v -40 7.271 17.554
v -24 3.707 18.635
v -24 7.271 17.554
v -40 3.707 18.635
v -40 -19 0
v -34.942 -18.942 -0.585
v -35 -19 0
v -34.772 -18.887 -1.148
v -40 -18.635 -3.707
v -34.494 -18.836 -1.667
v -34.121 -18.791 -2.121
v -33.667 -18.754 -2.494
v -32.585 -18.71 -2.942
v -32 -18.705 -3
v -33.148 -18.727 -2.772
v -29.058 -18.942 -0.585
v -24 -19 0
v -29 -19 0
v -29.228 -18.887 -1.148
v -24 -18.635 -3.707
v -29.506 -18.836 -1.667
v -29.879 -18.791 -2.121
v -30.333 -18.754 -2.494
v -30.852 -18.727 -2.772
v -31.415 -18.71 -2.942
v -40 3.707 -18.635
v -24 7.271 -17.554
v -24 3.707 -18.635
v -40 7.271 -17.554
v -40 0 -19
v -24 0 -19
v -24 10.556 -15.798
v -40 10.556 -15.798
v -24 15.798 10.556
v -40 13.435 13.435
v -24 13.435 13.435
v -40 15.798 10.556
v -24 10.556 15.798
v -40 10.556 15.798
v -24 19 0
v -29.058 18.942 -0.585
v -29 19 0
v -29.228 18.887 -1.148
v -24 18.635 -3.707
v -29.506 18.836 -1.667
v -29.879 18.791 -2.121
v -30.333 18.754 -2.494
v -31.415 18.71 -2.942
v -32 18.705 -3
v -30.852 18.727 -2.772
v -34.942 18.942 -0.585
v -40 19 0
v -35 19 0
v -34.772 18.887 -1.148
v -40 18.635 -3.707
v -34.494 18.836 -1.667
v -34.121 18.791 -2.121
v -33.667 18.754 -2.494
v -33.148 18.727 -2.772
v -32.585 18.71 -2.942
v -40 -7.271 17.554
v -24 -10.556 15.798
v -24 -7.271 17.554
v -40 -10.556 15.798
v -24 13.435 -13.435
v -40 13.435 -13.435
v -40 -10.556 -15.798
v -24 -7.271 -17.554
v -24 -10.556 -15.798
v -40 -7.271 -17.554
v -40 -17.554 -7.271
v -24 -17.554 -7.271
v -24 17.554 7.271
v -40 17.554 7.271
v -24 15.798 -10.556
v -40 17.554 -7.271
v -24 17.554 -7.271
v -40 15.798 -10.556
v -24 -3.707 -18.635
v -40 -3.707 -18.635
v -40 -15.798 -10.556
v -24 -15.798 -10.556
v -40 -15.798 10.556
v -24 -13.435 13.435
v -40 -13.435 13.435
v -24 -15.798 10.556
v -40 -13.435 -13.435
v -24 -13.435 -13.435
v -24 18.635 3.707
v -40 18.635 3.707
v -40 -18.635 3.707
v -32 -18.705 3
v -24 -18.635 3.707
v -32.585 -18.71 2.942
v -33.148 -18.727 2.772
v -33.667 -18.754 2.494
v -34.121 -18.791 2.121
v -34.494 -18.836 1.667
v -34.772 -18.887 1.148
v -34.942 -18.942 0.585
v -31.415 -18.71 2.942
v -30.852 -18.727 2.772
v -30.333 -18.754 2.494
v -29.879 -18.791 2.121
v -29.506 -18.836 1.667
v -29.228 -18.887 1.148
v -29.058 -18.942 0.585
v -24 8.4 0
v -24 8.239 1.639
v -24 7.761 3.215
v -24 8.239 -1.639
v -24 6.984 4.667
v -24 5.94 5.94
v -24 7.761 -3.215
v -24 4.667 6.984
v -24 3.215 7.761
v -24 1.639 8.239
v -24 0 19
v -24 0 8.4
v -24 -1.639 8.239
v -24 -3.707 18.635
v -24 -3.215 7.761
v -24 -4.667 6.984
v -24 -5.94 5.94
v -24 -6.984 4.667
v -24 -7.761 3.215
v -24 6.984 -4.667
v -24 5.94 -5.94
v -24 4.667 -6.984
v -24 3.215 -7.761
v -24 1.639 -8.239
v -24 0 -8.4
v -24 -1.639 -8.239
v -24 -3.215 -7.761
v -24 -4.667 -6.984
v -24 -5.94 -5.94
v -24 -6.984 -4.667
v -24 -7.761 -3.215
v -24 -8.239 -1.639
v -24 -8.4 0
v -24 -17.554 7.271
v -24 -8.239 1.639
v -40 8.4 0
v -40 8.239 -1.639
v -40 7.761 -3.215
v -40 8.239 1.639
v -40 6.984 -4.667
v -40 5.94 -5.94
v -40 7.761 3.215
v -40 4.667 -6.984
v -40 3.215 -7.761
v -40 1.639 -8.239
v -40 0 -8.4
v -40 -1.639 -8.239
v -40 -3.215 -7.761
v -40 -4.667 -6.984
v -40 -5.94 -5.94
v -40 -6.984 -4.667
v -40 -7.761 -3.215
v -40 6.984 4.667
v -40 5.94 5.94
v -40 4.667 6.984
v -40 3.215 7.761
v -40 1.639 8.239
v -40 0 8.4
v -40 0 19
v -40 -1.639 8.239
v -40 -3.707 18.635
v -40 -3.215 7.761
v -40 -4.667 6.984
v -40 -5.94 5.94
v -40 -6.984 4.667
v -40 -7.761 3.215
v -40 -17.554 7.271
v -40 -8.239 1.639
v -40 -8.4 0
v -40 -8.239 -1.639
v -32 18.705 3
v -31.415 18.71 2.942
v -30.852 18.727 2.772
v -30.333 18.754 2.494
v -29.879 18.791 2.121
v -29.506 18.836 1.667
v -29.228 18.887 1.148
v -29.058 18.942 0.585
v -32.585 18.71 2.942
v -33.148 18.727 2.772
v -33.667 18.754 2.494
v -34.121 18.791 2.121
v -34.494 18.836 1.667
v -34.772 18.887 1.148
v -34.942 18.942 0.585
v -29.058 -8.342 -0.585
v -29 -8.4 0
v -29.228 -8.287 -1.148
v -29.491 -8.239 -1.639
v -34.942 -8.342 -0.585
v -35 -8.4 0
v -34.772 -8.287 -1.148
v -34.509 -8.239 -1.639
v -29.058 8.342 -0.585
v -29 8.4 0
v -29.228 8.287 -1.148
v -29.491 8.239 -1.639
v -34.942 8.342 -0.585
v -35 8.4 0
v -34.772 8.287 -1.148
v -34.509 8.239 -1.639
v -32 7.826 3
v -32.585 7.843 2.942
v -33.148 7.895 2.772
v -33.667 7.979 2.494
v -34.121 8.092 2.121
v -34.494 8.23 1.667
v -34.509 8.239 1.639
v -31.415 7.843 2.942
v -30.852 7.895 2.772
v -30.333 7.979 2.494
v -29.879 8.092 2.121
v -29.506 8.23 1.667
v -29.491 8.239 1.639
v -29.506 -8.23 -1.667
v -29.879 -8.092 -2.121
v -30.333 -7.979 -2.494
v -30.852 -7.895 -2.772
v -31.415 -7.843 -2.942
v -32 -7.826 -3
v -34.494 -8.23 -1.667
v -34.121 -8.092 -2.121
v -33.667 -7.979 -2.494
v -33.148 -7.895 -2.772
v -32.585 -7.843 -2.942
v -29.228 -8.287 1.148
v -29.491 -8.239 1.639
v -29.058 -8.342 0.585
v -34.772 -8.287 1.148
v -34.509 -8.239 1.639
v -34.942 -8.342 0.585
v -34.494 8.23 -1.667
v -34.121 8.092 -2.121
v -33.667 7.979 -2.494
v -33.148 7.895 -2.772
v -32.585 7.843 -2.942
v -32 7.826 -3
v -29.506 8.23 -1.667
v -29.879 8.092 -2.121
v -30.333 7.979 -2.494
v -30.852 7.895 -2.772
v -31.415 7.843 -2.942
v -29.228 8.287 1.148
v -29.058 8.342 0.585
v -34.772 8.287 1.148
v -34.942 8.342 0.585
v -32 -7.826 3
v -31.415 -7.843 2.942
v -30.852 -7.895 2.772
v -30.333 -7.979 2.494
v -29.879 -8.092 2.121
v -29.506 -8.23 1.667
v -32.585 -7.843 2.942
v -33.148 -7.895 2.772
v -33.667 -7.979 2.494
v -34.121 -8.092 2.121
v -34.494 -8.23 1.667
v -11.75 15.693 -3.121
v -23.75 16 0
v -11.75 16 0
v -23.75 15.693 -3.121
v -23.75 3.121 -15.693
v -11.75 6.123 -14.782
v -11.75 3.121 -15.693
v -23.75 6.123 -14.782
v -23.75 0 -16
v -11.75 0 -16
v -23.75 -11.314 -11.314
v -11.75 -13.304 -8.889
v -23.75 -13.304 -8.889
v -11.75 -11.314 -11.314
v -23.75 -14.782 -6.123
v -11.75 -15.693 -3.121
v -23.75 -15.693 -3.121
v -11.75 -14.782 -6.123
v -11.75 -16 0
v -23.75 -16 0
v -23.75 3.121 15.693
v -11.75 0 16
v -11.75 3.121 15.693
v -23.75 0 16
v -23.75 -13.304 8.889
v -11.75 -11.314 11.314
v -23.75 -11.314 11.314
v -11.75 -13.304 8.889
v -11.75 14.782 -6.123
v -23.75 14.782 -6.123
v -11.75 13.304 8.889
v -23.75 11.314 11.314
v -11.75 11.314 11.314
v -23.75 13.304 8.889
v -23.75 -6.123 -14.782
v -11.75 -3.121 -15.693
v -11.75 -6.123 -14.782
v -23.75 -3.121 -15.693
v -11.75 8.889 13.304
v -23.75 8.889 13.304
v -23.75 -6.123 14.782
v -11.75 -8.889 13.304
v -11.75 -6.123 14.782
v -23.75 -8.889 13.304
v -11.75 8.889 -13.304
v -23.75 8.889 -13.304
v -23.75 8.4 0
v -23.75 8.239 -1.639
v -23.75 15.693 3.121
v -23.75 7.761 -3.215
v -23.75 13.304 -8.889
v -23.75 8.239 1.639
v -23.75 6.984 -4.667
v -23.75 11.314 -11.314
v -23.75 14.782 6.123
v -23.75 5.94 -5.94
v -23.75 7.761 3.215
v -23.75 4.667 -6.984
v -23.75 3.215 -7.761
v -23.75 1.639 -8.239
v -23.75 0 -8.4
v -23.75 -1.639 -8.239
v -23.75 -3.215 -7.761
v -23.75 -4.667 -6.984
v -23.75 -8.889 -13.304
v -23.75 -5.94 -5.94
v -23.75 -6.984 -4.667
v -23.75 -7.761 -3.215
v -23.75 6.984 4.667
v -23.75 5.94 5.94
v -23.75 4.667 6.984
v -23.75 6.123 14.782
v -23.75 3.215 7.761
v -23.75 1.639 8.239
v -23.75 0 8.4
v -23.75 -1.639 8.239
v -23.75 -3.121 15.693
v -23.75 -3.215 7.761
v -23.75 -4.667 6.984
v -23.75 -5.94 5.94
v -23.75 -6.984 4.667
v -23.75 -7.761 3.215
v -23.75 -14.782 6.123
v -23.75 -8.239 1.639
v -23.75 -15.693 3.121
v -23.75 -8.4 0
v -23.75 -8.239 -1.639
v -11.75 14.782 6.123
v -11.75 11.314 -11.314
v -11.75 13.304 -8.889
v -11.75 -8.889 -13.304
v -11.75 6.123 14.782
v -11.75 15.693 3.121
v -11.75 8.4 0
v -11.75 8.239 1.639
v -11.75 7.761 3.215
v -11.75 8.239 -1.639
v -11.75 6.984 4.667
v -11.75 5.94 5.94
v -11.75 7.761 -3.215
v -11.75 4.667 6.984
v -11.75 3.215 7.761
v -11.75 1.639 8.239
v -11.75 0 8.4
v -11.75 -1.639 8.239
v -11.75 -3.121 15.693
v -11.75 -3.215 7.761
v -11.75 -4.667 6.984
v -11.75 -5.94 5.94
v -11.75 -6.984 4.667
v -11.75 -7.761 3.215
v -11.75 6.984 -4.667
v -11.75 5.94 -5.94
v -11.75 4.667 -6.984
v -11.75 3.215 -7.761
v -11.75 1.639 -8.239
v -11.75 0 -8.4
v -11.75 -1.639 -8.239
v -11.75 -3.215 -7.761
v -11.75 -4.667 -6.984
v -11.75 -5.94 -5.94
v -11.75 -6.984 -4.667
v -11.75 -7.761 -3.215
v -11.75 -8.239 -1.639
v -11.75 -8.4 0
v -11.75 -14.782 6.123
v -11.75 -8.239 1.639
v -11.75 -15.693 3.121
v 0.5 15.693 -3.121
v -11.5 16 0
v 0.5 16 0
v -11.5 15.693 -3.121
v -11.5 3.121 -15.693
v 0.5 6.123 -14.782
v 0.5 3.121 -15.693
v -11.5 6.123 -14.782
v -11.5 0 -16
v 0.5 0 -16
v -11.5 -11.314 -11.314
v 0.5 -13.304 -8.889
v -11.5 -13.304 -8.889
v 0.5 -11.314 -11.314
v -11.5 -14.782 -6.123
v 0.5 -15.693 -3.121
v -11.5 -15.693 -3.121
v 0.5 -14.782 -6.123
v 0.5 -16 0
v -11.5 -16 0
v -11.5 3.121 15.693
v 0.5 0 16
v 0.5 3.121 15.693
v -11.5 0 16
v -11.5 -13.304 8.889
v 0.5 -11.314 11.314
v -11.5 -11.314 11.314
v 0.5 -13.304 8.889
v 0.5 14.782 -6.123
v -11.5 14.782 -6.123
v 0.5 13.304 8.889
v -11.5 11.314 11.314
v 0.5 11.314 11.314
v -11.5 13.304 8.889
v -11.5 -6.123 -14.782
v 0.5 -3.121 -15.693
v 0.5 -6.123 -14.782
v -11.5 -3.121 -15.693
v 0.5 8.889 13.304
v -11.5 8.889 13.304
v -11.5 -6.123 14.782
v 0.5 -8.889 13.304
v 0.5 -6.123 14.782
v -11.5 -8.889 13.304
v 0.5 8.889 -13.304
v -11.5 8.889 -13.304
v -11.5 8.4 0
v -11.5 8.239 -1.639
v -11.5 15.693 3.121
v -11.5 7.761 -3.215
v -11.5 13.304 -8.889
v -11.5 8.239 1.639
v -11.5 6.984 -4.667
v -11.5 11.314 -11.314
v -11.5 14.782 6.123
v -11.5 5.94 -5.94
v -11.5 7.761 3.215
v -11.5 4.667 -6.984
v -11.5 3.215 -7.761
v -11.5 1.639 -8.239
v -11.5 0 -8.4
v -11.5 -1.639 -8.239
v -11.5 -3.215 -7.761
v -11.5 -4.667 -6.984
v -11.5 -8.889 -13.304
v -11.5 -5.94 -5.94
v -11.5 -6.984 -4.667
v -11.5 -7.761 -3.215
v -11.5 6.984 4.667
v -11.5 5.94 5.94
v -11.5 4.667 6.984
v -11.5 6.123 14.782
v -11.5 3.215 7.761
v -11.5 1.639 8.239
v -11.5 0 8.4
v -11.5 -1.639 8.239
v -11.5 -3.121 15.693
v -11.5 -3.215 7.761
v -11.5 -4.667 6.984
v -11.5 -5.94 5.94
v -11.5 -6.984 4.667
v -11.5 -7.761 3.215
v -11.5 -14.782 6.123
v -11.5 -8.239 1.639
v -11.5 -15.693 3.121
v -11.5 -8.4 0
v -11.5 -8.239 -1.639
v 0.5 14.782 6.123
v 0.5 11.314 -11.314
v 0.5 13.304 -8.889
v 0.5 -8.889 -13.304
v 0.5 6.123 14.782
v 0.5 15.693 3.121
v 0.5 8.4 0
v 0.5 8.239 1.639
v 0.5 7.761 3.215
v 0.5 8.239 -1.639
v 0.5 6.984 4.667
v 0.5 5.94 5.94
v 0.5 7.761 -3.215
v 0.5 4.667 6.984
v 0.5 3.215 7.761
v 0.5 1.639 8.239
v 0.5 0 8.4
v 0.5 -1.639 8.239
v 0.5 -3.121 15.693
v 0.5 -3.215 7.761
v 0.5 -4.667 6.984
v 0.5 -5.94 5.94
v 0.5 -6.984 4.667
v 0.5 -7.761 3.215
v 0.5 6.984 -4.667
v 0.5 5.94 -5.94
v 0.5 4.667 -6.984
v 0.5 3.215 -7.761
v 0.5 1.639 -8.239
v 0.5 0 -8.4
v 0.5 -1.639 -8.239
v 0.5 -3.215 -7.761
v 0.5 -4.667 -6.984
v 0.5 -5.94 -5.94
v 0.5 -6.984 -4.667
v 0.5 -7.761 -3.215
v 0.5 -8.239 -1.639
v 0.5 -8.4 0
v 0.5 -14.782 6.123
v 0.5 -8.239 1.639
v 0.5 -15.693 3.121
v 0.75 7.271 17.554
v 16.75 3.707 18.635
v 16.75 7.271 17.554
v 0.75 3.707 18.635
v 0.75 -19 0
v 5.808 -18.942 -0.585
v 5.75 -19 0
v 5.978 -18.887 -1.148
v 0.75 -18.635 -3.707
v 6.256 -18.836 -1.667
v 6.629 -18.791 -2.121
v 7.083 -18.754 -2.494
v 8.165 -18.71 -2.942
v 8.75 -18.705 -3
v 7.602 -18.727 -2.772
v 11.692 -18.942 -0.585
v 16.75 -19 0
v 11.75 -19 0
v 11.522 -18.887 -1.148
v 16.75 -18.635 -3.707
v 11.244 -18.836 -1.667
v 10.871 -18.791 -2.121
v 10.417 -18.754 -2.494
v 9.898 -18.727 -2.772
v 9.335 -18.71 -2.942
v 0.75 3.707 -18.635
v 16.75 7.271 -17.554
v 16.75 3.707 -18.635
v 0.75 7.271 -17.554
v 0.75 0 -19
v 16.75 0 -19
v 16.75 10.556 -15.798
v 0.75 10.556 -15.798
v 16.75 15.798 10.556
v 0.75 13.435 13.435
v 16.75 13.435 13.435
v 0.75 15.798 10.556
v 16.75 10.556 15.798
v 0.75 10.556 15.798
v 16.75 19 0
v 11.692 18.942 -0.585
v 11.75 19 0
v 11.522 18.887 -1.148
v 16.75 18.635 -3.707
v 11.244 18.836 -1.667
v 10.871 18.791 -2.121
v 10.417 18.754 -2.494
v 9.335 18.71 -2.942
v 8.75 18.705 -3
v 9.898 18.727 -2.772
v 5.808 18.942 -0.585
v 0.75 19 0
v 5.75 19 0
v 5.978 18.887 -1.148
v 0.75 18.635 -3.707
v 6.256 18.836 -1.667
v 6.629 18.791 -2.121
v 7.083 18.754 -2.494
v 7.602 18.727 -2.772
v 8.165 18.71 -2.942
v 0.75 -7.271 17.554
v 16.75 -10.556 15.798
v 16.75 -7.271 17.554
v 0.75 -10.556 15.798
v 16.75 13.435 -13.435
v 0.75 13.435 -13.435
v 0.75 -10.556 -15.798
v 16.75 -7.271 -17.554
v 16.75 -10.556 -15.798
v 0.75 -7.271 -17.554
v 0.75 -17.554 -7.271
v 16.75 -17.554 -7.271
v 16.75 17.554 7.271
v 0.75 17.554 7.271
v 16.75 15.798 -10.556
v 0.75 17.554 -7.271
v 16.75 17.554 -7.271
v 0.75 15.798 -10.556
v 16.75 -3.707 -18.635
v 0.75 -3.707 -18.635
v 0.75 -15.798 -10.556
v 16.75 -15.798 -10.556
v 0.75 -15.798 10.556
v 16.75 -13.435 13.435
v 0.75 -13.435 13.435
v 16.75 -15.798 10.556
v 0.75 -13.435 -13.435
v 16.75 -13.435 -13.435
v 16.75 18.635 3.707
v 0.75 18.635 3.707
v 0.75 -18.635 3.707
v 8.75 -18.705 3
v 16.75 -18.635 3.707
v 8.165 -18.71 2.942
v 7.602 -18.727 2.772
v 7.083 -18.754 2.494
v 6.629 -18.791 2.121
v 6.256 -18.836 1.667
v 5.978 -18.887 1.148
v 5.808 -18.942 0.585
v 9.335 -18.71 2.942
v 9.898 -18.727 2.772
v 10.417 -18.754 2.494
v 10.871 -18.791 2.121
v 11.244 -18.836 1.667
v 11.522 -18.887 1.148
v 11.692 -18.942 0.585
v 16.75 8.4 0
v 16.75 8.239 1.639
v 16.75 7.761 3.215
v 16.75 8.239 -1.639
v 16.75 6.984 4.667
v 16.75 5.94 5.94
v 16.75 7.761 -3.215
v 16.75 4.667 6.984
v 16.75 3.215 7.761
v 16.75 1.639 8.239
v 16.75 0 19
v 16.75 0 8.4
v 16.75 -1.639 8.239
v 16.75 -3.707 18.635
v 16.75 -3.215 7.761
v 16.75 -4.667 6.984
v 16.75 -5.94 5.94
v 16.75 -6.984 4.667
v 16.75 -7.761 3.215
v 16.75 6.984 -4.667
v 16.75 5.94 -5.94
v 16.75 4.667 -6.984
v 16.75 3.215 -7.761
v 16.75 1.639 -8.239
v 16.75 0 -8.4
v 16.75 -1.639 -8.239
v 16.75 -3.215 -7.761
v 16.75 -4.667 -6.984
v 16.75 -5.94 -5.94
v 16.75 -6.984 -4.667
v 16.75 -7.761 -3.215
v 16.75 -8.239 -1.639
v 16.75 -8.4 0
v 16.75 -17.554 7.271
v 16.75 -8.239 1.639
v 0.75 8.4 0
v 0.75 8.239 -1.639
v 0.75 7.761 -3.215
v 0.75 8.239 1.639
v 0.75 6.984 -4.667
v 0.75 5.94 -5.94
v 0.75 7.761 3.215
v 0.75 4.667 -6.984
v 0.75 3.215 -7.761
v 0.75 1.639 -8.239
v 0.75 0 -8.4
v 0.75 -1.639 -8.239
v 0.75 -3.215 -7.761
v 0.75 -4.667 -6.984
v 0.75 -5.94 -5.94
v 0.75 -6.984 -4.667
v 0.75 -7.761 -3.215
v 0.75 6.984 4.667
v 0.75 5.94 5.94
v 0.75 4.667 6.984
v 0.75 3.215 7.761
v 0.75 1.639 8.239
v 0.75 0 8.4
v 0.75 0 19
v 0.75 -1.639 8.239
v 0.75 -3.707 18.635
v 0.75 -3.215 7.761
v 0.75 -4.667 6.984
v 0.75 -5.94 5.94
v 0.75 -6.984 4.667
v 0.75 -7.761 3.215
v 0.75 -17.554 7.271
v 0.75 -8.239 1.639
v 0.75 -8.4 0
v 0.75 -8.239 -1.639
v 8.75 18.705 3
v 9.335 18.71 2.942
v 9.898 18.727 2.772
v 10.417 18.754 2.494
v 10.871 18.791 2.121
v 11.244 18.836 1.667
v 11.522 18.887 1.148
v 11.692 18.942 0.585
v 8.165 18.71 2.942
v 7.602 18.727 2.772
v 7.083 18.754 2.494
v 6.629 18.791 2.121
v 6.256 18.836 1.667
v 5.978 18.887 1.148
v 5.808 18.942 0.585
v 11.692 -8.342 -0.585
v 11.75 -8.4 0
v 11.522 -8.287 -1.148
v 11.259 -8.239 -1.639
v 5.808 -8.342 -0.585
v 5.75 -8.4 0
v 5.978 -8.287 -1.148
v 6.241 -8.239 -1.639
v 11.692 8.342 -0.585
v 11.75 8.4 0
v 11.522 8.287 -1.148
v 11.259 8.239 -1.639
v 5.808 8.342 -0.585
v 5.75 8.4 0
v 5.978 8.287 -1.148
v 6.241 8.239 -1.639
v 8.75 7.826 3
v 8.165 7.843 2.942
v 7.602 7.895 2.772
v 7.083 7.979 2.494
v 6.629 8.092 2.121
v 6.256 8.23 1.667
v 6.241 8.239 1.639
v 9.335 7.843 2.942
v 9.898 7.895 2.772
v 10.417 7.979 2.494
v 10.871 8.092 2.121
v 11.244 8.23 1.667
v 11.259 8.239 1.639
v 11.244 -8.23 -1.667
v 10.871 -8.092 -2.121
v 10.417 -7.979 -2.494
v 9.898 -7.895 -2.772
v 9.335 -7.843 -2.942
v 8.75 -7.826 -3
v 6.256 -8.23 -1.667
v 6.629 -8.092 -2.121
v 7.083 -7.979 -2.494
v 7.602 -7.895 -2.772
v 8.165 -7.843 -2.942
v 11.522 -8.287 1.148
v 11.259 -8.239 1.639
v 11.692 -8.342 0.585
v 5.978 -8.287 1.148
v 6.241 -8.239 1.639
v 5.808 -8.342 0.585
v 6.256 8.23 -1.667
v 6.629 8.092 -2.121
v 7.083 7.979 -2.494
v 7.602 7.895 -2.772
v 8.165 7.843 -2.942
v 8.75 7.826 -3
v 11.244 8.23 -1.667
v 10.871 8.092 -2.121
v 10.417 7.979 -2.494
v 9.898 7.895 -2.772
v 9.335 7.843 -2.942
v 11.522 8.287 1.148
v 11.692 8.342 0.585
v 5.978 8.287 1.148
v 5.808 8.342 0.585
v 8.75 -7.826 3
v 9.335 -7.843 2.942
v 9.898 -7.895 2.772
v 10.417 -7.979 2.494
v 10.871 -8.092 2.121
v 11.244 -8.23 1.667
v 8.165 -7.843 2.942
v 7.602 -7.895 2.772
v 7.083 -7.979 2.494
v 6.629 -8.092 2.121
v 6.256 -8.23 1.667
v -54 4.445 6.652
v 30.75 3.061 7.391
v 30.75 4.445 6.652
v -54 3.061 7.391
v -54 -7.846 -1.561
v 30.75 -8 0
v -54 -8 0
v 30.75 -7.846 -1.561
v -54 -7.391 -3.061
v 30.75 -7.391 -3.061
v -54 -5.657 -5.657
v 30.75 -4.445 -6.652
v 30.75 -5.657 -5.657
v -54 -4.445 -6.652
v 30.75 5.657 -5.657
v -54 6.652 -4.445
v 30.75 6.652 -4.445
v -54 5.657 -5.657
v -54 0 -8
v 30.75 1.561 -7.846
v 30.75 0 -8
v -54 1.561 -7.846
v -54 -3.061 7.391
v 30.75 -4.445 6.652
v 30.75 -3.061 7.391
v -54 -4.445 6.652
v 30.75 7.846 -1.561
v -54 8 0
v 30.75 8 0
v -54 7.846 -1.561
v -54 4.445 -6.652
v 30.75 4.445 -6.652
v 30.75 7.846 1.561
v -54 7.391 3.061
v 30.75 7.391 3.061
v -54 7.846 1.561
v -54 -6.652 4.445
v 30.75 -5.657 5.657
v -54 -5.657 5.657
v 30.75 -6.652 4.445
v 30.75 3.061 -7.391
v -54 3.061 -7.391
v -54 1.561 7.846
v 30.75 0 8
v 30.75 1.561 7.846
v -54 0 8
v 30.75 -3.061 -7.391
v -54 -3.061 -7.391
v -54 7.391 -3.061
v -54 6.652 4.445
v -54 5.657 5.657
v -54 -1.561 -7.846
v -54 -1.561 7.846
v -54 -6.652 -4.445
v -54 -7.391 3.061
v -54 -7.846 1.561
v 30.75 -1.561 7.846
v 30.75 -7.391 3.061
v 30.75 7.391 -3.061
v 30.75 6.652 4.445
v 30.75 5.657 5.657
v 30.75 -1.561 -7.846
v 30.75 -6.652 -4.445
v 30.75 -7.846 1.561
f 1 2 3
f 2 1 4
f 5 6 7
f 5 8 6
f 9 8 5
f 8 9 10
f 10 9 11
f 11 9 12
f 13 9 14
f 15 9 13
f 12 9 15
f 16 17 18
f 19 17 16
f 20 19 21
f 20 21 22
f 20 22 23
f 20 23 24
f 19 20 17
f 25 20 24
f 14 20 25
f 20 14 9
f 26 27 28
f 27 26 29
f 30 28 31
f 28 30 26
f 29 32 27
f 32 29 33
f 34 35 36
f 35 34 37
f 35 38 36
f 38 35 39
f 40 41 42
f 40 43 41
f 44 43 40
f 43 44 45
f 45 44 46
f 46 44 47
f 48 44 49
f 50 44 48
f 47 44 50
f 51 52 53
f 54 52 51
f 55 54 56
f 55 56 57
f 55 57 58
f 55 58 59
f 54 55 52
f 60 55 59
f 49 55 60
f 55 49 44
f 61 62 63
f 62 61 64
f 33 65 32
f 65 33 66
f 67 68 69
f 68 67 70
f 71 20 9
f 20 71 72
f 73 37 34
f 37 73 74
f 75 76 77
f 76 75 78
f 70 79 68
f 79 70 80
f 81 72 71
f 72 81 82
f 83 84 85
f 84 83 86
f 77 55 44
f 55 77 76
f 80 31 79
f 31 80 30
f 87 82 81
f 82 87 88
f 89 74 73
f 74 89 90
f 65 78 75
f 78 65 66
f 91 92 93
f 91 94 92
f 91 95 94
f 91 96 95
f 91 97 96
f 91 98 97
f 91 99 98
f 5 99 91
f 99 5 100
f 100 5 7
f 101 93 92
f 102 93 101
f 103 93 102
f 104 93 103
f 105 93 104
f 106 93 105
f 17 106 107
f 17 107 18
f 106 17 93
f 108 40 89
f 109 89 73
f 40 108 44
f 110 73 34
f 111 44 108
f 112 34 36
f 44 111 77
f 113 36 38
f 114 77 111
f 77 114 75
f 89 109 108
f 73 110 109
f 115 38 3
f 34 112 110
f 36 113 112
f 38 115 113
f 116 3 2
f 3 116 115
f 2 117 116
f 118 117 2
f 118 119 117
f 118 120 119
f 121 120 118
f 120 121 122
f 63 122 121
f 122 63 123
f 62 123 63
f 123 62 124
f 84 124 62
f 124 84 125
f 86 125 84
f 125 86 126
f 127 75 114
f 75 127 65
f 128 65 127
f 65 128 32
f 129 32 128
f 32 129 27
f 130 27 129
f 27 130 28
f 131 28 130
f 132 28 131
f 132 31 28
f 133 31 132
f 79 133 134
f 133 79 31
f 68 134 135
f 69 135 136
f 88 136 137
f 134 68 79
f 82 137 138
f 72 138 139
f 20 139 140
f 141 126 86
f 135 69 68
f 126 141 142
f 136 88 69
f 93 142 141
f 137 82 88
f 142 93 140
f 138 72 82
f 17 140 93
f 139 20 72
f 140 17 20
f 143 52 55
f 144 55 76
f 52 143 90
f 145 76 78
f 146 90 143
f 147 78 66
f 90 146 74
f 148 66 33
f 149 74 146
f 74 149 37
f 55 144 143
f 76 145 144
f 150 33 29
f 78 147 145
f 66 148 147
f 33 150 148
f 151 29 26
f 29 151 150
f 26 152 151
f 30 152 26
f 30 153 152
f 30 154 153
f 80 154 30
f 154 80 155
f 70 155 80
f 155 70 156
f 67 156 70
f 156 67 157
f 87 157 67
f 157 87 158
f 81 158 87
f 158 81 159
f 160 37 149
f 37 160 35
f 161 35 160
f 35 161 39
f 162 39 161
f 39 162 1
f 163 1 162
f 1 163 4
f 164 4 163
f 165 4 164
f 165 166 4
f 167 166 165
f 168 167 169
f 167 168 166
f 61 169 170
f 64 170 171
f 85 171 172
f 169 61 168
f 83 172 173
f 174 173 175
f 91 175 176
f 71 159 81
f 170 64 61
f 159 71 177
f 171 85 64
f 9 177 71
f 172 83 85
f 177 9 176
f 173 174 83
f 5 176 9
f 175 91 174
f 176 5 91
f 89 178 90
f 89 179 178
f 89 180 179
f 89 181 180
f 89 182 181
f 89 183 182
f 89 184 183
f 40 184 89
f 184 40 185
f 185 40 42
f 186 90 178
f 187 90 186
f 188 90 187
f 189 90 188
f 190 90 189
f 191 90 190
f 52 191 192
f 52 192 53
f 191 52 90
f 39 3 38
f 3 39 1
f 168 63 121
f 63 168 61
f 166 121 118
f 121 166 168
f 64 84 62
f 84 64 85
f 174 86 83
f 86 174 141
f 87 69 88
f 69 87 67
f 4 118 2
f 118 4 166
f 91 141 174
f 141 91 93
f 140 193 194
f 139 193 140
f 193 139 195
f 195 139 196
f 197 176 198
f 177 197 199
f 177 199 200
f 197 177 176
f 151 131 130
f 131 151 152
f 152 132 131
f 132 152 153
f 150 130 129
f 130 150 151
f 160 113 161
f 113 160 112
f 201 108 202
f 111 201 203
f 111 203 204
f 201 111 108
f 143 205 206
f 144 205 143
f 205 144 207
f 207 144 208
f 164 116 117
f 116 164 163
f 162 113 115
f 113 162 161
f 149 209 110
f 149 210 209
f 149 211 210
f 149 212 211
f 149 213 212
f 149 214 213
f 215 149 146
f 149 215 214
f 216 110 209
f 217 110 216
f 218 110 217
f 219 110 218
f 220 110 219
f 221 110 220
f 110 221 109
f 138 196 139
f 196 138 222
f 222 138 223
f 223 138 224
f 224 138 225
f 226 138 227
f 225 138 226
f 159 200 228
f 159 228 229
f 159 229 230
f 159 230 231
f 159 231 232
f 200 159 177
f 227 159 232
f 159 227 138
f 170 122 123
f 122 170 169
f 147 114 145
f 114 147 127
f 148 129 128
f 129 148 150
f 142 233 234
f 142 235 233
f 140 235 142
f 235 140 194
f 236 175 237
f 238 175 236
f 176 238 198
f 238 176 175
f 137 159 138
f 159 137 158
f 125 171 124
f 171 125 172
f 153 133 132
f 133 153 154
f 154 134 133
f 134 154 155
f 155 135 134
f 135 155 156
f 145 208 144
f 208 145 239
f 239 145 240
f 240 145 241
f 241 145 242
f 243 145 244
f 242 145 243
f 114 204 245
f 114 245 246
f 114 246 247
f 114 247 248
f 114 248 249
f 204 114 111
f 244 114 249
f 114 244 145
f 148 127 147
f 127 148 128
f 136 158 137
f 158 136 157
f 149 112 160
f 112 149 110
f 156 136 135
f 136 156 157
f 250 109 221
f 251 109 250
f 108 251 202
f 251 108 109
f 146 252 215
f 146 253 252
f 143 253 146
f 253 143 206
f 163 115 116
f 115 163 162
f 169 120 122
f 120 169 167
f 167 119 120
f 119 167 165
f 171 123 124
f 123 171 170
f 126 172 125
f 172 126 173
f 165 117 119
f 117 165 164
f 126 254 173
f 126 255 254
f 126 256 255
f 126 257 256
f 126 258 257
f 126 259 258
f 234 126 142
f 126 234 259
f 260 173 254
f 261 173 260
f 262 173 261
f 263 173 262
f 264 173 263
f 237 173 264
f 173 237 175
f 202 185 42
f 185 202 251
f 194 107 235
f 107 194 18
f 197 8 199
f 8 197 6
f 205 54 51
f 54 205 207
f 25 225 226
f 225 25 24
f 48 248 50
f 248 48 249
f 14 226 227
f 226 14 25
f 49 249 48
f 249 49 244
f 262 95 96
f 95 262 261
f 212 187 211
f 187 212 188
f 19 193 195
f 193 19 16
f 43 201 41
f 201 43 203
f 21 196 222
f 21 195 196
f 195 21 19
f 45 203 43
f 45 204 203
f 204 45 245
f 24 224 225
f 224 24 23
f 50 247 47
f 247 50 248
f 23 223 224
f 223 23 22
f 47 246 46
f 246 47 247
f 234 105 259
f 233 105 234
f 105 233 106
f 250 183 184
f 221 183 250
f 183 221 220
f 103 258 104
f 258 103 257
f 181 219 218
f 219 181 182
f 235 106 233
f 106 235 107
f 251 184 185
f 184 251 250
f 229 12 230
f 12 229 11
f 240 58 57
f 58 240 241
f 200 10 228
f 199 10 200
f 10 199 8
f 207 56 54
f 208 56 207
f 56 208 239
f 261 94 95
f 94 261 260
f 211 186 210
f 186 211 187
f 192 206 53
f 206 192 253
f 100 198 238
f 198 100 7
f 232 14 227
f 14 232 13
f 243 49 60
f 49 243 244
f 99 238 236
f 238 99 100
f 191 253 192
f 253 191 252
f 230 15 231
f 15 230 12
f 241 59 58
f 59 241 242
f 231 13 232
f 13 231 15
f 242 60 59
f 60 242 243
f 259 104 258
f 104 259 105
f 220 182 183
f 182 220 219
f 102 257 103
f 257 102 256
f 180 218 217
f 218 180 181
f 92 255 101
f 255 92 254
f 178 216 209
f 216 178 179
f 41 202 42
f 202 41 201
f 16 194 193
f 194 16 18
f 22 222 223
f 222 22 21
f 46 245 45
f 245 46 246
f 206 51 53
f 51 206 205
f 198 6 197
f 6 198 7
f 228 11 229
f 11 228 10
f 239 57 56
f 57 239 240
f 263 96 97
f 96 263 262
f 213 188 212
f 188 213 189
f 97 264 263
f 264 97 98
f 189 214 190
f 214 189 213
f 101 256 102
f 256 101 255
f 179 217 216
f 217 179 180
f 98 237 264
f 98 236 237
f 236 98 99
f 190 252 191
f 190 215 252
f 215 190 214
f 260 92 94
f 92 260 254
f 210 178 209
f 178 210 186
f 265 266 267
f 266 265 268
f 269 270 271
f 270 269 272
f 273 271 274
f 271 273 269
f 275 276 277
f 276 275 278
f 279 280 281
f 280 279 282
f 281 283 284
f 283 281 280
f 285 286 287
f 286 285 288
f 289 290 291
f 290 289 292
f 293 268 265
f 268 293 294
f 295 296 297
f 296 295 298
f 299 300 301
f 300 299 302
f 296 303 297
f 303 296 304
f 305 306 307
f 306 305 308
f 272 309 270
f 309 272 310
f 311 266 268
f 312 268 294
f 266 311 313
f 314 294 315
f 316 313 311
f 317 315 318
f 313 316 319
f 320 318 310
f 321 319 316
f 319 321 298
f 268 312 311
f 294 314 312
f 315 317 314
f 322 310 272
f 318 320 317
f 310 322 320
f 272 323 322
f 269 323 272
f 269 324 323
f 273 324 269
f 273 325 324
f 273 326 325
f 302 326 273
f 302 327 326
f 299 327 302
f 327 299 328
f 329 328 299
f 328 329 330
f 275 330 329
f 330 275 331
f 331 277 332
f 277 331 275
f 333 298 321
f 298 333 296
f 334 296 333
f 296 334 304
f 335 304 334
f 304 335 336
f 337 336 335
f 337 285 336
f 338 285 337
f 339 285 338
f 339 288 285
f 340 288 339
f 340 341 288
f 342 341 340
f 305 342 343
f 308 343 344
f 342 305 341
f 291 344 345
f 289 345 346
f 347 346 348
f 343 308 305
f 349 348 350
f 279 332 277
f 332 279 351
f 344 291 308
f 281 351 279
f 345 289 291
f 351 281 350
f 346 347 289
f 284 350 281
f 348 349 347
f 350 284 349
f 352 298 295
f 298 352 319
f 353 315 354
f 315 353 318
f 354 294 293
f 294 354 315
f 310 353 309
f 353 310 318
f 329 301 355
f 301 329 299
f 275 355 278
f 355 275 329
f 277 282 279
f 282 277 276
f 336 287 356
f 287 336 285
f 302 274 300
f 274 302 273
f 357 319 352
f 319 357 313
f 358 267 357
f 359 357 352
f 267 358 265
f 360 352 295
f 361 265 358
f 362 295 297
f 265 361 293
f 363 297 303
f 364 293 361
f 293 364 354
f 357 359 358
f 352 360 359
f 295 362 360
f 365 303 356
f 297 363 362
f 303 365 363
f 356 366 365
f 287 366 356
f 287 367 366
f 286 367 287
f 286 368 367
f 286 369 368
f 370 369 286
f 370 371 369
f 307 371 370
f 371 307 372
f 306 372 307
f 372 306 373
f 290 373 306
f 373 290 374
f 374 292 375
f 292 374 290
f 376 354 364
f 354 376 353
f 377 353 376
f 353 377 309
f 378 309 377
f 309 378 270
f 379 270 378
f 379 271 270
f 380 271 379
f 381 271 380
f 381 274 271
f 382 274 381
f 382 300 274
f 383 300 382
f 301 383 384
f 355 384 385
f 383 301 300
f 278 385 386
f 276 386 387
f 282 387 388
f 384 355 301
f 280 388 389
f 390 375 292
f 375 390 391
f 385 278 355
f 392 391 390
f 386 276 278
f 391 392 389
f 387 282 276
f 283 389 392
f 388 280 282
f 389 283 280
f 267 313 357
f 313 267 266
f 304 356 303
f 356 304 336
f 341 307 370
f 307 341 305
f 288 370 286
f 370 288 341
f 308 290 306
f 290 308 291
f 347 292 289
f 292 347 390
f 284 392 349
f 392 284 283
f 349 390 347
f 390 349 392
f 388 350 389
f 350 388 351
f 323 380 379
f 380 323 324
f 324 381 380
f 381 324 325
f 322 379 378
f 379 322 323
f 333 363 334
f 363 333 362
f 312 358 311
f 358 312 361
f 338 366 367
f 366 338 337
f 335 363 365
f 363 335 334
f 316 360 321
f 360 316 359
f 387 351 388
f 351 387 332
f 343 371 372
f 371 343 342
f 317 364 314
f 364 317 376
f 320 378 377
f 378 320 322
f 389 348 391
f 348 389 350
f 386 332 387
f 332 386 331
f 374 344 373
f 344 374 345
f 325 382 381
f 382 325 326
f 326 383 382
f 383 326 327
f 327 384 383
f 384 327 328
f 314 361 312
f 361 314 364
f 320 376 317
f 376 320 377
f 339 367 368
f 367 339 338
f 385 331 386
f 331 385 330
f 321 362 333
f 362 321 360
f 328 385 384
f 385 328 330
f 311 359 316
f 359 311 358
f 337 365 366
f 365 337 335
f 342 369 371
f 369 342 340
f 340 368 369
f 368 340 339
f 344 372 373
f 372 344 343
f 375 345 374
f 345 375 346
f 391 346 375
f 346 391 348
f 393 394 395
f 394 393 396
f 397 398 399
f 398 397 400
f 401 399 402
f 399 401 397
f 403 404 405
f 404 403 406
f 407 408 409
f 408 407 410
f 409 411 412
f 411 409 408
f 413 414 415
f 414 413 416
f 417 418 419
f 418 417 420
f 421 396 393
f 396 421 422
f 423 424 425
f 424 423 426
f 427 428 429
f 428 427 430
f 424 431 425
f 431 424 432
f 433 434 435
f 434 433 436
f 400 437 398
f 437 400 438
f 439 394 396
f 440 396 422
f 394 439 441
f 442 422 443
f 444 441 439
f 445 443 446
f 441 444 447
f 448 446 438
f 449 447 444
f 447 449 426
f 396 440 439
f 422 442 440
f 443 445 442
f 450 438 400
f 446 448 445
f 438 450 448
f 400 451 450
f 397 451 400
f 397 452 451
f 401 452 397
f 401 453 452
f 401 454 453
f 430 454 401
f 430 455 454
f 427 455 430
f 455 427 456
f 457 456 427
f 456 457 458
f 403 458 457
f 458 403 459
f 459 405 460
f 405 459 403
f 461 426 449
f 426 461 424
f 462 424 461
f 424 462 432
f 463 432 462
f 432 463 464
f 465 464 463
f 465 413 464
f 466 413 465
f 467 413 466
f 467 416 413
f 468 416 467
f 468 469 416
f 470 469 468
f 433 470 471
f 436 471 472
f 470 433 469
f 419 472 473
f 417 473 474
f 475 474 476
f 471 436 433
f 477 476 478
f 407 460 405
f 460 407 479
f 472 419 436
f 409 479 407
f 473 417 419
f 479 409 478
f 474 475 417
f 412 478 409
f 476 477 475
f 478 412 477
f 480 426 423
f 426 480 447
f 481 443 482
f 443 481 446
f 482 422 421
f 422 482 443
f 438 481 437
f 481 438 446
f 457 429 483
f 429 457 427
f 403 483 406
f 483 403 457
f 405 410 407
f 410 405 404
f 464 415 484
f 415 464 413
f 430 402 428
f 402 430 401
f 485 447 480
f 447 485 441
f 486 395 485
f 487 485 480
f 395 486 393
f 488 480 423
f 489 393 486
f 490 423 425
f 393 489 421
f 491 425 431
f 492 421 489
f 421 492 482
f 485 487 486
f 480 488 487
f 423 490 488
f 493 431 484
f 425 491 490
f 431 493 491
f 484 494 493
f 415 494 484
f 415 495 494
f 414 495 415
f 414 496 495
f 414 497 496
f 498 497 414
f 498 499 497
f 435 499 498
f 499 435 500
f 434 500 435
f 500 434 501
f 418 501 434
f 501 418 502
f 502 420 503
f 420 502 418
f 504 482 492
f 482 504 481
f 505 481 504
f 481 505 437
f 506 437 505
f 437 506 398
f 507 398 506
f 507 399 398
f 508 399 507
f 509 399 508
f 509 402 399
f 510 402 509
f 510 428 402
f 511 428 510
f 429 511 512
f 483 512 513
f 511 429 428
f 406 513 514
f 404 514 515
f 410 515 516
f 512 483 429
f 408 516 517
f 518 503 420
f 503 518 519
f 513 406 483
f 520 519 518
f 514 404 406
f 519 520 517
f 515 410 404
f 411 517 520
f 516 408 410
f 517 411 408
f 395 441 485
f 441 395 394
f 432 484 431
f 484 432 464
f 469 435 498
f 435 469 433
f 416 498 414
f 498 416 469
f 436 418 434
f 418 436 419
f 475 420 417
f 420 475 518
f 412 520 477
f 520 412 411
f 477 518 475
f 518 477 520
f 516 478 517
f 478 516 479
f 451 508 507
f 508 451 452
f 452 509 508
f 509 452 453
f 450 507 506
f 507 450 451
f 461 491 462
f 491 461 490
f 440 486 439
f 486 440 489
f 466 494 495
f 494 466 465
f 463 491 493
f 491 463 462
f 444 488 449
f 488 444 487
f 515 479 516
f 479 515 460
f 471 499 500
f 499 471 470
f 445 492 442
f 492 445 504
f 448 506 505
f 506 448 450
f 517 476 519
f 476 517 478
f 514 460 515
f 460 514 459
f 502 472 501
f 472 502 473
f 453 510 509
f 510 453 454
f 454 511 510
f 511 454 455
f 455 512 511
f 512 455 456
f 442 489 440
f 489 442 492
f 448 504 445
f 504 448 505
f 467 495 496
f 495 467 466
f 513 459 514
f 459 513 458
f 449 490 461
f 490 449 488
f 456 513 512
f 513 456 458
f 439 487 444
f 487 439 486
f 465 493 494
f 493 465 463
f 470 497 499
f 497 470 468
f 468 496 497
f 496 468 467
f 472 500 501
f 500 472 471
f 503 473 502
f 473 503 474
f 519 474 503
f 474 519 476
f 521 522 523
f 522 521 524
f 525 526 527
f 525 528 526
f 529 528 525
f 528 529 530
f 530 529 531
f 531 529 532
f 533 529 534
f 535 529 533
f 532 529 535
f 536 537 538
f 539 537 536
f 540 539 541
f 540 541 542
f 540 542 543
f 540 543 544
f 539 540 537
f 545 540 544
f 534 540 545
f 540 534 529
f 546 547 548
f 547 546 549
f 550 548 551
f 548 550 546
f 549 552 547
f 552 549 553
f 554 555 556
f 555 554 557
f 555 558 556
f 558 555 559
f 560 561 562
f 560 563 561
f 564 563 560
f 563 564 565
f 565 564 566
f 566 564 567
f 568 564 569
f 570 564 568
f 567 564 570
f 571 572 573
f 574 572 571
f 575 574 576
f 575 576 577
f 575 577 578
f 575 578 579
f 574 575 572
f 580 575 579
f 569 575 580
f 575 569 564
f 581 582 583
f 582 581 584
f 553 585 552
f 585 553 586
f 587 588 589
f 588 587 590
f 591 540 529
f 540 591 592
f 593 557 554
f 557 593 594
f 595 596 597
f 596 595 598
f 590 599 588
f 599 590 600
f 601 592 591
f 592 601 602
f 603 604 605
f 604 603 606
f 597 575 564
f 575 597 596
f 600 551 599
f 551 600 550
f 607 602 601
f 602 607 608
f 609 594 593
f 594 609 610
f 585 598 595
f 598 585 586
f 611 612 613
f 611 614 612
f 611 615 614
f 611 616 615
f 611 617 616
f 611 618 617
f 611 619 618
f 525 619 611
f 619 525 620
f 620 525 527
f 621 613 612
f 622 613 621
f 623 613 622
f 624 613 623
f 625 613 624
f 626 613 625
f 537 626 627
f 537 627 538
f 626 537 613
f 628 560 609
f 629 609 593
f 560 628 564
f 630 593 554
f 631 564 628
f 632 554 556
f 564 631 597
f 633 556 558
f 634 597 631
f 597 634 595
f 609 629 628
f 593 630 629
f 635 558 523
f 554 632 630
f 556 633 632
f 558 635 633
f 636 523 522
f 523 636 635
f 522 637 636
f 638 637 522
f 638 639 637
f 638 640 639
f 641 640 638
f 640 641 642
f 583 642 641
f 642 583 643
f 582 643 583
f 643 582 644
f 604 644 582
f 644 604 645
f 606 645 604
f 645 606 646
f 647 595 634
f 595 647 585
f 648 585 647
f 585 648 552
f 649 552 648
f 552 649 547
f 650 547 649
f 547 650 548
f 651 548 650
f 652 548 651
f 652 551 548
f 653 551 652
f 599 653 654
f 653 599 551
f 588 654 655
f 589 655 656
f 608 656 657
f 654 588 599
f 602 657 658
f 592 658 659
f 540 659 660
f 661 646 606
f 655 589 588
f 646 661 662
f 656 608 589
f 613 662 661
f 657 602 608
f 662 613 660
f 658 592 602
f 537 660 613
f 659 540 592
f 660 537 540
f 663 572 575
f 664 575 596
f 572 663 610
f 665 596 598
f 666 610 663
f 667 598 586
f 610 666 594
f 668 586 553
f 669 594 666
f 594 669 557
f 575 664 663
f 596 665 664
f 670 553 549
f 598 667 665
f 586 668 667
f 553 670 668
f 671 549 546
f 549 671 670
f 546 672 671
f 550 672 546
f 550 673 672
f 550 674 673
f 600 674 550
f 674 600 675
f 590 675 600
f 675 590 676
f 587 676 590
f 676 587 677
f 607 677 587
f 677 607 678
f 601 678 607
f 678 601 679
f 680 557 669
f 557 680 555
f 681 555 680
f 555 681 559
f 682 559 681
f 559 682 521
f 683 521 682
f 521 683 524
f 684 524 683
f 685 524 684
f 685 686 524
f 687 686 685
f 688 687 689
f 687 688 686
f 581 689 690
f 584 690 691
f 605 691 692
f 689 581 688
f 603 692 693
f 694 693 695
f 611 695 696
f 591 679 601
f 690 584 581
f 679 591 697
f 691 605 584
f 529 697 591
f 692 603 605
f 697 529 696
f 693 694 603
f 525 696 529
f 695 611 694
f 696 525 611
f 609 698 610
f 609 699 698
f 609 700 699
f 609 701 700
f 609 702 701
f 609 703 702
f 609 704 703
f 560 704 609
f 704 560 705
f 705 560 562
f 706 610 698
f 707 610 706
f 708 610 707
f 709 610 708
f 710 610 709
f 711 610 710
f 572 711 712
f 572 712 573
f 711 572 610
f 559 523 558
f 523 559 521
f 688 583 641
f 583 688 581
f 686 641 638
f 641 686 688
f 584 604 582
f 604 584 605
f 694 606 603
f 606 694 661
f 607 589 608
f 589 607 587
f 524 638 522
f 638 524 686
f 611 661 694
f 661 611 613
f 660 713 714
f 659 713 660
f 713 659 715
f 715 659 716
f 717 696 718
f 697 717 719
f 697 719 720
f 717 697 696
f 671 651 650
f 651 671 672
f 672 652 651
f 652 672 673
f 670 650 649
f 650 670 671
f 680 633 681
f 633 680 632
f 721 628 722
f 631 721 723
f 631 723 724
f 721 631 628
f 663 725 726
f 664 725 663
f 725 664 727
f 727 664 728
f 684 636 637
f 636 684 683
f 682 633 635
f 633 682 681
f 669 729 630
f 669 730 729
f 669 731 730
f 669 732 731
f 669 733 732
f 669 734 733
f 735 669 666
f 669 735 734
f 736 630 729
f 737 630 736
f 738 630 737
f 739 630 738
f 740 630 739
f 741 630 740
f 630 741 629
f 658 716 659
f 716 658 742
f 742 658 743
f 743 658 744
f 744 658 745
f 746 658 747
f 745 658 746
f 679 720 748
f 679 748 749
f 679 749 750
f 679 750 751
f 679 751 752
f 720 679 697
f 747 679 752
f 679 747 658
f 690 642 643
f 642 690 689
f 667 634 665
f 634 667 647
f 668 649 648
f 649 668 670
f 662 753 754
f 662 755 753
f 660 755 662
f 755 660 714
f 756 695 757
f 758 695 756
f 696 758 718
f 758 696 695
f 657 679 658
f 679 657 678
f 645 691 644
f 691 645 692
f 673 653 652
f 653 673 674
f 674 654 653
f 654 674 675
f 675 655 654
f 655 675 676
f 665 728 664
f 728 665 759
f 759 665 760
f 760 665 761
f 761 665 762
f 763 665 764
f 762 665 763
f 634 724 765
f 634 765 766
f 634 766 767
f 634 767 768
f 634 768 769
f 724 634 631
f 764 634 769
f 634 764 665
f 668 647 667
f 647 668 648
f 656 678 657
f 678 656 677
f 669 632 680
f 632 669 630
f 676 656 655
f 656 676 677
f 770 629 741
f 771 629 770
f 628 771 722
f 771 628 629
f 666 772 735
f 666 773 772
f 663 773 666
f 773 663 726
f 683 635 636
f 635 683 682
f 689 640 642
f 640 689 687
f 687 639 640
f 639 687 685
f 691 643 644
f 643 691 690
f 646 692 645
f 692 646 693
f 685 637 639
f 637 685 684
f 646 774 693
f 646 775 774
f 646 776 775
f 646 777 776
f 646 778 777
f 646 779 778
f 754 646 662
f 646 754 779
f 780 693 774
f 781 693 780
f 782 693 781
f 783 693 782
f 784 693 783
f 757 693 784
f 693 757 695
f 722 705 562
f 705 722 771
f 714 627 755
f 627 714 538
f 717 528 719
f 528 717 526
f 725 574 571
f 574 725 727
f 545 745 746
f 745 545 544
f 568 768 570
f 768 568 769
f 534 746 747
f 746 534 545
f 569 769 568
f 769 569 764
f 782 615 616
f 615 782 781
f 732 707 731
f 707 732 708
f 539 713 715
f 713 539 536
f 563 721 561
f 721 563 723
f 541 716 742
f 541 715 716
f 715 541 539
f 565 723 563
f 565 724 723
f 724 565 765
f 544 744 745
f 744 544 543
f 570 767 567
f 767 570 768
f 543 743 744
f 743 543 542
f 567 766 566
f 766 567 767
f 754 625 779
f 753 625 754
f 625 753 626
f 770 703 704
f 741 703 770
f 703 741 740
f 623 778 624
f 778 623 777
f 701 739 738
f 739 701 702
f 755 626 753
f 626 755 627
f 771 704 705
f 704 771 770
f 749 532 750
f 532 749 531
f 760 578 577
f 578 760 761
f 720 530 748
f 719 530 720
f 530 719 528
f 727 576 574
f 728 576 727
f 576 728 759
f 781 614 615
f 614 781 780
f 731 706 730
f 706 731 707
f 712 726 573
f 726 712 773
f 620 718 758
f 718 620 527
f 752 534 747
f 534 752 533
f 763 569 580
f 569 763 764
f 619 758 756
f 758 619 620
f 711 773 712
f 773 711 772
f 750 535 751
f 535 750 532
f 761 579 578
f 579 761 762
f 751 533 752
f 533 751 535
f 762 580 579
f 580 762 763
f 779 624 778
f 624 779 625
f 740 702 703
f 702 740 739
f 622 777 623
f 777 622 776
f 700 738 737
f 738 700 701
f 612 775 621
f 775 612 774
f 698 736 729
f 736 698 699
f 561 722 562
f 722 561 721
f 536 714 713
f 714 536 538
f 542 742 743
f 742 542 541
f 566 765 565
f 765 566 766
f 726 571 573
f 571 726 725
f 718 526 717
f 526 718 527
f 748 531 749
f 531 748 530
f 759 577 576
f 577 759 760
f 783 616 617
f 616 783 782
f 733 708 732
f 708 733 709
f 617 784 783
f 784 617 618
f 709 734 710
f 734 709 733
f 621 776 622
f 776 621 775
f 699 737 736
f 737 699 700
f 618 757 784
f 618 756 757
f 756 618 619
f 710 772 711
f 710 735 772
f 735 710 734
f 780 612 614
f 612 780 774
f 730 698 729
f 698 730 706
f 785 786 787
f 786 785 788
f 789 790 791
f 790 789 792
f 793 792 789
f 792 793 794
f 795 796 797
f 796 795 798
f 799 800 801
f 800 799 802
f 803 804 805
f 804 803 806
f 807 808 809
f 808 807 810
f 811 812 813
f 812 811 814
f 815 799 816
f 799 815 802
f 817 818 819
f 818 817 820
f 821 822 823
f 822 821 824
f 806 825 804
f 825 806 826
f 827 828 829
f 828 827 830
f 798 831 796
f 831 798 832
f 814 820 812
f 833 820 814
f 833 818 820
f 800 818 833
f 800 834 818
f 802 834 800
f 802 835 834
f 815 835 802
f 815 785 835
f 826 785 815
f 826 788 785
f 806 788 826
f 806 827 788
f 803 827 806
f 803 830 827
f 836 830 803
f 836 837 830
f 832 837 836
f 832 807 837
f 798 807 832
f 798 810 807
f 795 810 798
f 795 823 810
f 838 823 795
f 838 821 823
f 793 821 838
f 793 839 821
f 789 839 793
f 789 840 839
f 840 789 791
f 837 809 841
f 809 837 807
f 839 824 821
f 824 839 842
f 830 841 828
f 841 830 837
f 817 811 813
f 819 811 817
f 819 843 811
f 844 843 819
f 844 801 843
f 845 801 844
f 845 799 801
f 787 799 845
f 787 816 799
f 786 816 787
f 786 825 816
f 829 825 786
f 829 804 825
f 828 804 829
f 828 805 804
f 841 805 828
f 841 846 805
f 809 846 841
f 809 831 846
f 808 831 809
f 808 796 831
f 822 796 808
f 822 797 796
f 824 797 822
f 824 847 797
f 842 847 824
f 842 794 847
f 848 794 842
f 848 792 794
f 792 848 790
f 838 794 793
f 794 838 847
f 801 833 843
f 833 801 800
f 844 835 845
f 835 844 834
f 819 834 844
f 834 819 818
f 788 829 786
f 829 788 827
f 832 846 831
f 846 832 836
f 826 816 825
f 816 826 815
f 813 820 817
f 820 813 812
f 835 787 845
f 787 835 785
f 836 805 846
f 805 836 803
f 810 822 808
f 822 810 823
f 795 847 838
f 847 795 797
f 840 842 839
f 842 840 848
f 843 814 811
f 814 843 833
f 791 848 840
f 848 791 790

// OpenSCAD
$fn = 32;

// ------------------------------------------------------------------------
// Shaft with rings and collars: d16 shaft, 4 rings
// Every part is its own module, assembly() places them once.
// ------------------------------------------------------------------------

// --- part 1 ---
module shaft() {
  translate([0, 0, -42.375]) cylinder(h = 84.75, d = 16);
}

// --- part 2 ---
module collar_a() {
  difference() {
    cylinder(h = 16, d = 38);
    translate([0, 0, -1]) cylinder(h = 18, d = 16.8);
    translate([0, 0, 8]) rotate([90, 0, 0]) cylinder(h = 40, d = 6, center = true);
  }
}

// --- part 3 ---
module spacer_a() {
  difference() {
      translate([0, 0, 0]) cylinder(h = 12, d = 32);
      translate([0, 0, -1]) cylinder(h = 14, d = 16.8);
    }
}

// --- part 4 ---
module spacer_b() {
  difference() {
      translate([0, 0, 0]) cylinder(h = 12, d = 32);
      translate([0, 0, -1]) cylinder(h = 14, d = 16.8);
    }
}

// --- part 5 ---
module collar_b() {
  difference() {
    cylinder(h = 16, d = 38);
    translate([0, 0, -1]) cylinder(h = 18, d = 16.8);
    translate([0, 0, 8]) rotate([90, 0, 0]) cylinder(h = 40, d = 6, center = true);
  }
}

// --- assembly ---
module assembly() {
  translate([-11.625, 0, 0]) rotate([0, 90, 0]) shaft();
  translate([-40, 0, 0]) rotate([0, 90, 0]) collar_a();
  translate([-23.75, 0, 0]) rotate([0, 90, 0]) spacer_a();
  translate([-11.5, 0, 0]) rotate([0, 90, 0]) spacer_b();
  translate([0.75, 0, 0]) rotate([0, 90, 0]) collar_b();
}

assembly();
